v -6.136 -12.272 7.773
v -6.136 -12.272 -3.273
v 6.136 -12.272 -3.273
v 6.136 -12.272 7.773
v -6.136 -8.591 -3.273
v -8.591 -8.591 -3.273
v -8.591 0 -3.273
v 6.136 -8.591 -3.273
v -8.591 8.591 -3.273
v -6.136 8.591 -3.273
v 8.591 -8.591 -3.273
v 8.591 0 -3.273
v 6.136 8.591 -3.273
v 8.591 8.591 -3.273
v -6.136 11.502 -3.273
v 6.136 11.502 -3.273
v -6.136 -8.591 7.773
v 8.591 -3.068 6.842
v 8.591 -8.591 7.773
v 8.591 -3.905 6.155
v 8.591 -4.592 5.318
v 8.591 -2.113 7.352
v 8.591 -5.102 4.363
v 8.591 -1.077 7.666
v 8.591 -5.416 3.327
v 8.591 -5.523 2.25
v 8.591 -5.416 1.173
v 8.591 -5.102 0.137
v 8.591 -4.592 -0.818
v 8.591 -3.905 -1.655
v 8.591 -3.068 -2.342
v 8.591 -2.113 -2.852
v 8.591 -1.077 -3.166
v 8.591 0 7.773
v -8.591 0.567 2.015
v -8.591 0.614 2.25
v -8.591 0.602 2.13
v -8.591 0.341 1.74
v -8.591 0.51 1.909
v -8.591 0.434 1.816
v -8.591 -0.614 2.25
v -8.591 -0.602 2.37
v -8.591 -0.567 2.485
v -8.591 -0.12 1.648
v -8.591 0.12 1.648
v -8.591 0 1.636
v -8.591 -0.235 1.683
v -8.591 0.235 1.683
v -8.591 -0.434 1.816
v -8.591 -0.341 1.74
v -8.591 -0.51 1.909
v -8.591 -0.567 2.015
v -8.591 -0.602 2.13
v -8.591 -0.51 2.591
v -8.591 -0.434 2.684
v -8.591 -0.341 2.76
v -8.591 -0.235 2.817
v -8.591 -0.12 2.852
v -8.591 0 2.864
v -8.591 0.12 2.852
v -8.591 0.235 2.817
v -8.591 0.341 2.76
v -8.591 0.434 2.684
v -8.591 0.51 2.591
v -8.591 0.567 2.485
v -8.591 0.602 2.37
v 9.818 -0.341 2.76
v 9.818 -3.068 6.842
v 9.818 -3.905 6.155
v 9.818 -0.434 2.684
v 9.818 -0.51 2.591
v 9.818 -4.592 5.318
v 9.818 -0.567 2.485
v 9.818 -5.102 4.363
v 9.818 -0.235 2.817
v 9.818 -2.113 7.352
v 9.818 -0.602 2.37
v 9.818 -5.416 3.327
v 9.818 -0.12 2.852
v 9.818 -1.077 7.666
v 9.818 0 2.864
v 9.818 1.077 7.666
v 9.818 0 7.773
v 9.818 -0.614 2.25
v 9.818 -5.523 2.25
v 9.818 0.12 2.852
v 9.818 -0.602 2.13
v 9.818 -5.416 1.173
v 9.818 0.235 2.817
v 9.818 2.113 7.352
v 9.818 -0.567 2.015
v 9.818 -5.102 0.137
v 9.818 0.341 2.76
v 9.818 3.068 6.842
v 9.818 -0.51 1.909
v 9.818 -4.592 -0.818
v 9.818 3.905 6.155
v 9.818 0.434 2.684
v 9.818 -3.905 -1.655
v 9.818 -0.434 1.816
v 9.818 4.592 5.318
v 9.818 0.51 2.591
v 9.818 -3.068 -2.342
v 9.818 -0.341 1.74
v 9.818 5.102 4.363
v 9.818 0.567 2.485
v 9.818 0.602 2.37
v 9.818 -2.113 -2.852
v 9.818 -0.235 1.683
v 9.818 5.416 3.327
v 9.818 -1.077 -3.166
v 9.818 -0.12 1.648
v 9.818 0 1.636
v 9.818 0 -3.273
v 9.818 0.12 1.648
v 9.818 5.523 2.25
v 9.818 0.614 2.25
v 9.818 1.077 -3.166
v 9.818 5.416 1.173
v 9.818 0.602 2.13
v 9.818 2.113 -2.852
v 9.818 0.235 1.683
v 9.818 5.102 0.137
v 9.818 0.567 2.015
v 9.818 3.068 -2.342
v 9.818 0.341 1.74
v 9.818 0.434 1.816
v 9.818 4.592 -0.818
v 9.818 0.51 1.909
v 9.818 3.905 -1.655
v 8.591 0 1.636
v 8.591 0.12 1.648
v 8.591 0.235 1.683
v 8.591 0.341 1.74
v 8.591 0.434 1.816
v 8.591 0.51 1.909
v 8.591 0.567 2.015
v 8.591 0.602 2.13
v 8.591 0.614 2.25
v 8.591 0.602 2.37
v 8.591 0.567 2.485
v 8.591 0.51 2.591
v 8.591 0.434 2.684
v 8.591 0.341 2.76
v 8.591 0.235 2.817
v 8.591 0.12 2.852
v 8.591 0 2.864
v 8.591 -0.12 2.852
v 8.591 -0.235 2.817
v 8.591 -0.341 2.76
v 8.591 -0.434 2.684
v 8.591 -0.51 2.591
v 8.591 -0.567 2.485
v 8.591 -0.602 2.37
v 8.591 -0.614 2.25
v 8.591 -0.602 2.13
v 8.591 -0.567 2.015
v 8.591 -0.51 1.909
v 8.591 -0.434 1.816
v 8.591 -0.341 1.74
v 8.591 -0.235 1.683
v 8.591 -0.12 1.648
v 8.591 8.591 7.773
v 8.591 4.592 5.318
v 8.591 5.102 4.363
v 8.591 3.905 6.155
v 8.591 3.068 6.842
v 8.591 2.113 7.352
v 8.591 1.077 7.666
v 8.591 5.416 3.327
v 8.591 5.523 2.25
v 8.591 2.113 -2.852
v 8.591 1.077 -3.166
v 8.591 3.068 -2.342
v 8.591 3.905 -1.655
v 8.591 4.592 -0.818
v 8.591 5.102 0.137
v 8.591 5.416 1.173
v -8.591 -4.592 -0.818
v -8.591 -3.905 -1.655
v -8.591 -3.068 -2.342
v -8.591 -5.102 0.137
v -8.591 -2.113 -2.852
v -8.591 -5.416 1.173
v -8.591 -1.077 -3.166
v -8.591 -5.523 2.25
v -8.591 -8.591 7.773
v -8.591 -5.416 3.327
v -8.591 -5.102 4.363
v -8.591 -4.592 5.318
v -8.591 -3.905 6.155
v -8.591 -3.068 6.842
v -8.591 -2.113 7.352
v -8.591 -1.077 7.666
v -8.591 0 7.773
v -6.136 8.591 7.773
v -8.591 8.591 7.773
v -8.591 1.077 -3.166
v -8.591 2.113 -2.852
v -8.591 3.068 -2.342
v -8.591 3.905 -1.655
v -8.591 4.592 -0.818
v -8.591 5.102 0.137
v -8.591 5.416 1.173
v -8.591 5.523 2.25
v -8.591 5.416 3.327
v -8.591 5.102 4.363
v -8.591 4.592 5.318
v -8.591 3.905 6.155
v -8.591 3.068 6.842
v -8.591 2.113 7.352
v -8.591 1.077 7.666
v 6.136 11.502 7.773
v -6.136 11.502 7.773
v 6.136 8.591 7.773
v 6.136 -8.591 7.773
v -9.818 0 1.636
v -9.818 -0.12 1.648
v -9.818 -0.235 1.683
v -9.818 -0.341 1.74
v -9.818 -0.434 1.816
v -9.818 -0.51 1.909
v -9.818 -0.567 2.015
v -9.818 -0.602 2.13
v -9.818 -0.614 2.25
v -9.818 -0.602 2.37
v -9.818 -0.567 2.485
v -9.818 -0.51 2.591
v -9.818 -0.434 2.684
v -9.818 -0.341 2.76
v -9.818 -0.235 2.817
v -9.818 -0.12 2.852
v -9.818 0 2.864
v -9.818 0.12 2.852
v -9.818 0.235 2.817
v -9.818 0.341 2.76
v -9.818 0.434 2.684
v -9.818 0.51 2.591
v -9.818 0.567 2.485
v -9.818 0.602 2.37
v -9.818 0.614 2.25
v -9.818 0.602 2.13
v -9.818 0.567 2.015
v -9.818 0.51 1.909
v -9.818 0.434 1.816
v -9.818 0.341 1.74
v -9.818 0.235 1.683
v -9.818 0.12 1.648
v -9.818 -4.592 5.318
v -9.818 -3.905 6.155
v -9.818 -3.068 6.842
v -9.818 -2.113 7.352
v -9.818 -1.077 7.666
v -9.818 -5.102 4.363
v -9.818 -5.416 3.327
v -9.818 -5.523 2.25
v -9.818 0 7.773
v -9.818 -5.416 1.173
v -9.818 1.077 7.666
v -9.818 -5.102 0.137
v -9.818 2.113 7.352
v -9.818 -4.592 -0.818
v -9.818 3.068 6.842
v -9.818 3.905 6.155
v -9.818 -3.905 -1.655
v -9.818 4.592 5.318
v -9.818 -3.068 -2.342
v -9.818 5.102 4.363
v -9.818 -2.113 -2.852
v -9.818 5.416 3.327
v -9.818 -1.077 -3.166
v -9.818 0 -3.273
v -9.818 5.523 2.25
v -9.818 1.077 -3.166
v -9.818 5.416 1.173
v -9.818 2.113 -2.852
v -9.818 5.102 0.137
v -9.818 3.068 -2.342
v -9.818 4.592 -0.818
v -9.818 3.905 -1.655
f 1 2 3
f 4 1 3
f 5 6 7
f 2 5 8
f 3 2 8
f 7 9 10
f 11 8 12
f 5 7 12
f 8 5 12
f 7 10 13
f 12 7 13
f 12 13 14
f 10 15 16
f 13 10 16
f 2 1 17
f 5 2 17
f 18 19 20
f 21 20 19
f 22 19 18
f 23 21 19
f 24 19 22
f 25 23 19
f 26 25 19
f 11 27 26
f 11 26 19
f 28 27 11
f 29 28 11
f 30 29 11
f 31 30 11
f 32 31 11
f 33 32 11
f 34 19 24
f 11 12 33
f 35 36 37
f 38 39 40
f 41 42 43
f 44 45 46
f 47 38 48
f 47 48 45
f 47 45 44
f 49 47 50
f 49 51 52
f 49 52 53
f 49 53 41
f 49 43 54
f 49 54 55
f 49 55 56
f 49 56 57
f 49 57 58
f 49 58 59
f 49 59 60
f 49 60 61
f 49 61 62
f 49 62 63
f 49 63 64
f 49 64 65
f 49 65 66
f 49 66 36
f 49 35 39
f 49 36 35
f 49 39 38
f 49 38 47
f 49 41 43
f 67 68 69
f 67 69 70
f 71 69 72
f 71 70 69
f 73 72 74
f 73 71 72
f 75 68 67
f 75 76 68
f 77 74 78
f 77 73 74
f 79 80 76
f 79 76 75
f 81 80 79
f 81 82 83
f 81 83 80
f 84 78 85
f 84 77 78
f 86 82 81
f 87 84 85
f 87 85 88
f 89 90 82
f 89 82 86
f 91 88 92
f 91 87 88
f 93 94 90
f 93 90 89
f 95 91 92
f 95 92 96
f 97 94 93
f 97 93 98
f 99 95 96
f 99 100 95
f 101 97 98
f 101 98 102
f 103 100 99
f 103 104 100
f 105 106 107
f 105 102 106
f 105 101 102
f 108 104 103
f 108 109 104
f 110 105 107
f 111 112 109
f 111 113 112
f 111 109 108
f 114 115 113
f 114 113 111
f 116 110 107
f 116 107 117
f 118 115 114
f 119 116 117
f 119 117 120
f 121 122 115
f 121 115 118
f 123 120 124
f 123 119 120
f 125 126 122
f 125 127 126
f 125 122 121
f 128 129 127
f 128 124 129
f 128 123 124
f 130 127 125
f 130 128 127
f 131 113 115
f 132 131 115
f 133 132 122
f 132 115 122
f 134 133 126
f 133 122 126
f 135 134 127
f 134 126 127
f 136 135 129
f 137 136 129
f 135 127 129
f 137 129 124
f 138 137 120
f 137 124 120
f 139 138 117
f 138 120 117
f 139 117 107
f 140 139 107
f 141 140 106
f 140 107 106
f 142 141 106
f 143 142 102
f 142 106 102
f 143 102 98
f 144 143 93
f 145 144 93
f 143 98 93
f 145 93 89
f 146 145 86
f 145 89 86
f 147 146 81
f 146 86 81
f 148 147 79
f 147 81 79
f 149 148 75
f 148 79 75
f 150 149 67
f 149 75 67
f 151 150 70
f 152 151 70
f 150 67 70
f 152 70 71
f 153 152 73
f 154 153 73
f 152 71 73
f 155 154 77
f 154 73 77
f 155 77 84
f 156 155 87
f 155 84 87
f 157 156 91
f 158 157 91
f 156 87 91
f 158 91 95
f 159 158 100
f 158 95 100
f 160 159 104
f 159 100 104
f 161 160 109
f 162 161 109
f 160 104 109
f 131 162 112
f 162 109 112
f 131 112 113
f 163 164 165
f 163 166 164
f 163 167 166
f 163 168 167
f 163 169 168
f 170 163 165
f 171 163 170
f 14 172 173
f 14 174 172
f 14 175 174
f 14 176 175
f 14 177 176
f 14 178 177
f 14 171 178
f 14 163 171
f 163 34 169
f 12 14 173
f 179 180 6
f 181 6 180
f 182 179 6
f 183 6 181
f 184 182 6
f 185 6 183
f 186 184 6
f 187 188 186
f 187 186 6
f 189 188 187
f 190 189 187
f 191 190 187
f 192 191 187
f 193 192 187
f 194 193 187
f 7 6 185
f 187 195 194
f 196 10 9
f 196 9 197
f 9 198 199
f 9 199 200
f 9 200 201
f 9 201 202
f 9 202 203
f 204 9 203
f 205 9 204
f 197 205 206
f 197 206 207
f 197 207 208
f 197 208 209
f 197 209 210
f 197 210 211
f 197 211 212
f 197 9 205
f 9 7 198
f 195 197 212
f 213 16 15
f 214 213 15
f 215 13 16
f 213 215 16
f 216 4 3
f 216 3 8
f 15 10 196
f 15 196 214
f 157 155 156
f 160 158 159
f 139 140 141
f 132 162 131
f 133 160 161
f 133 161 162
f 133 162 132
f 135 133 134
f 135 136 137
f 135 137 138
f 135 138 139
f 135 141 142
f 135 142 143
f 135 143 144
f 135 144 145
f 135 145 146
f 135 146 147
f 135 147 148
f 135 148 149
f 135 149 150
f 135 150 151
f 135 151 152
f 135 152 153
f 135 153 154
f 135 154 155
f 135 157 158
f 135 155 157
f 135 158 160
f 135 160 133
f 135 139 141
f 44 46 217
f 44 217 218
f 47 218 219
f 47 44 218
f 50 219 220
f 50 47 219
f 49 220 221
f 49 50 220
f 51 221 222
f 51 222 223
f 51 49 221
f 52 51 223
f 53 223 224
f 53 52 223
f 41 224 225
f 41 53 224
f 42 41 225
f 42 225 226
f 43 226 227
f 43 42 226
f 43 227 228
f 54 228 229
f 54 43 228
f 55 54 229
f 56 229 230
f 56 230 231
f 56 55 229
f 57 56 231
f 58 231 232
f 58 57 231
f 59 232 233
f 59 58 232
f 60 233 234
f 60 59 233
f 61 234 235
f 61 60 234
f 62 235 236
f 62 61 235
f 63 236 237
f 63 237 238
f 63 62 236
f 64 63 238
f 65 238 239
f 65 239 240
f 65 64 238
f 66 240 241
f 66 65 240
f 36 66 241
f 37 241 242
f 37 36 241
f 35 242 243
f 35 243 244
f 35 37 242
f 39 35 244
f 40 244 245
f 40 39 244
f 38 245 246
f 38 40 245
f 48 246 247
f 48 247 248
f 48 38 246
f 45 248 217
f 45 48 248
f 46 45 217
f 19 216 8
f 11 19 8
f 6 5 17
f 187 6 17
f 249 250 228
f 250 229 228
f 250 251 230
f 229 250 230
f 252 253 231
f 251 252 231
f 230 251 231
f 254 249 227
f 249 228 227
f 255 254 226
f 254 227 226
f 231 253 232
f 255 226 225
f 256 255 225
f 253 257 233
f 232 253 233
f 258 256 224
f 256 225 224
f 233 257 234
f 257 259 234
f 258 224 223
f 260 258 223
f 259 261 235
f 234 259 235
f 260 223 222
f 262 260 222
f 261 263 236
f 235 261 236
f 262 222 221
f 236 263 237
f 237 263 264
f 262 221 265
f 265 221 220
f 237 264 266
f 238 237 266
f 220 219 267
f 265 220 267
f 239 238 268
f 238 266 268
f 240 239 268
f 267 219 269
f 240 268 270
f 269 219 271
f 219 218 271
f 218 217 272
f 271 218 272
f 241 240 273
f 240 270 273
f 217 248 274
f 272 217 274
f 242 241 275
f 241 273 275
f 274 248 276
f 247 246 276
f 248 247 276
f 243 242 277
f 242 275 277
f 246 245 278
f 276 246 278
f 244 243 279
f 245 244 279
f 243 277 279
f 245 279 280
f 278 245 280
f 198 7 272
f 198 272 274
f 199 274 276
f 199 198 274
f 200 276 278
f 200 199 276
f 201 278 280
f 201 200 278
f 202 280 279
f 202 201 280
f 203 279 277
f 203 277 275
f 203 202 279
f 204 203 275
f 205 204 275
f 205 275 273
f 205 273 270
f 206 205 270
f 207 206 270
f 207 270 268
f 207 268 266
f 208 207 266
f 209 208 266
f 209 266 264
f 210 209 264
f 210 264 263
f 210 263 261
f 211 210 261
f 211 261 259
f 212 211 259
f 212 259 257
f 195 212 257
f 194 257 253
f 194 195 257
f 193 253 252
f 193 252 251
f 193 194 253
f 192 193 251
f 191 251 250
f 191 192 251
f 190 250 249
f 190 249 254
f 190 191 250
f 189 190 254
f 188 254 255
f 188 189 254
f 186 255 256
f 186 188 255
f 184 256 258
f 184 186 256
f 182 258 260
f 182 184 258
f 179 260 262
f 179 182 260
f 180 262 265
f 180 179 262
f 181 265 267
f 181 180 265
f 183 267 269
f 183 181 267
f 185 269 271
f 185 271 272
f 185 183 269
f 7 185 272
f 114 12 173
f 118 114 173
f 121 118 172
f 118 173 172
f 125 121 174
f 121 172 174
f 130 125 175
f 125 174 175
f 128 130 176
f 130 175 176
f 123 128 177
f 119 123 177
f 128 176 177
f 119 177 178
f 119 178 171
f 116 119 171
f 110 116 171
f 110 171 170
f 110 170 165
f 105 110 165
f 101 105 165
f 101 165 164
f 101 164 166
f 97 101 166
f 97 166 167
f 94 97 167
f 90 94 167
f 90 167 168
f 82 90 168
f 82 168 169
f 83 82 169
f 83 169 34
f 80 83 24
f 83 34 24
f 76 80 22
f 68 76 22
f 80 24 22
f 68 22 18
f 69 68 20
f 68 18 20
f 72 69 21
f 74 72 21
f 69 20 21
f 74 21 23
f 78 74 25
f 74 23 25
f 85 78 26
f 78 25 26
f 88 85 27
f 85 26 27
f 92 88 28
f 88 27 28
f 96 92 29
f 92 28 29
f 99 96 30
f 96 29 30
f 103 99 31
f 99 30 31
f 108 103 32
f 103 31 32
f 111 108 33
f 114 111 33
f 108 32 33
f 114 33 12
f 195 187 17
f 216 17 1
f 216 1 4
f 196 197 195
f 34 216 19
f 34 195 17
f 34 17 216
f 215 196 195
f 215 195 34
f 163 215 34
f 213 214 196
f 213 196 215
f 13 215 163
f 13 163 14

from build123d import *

# Parameters (mm, degrees)
SKETCH_4_W          = 5
SKETCH_4_H          = 10
EXTRUDE_2_DEPTH     = 4.5
SKETCH_5_W          = 4.5
SKETCH_5_H          = 7
EXTRUDE_3_DEPTH     = 1
SKETCH_6_W          = 4.5
SKETCH_6_H          = 7
EXTRUDE_4_DEPTH     = 1
SKETCH_7_R          = 2.25
EXTRUDE_5_DEPTH     = 0.5
SKETCH_8_R          = 0.25
CUT_EXTRUDE_1_DEPTH = 0.5
CUT_EXTRUDE_START   = -0.5
SKETCH_9_R          = 0.25
CUT_EXTRUDE_2_DEPTH = 0.5
SCALE_1_SCALE       = 3.181818182
SCALE_2_SCALE       = 2.454545455
SCALE_3_SCALE       = 0.771428571
SCALE_4_SCALE       = 0.407393437
SKETCH_10_W         = 14.212580929
SKETCH_10_H         = 3.204768758
CUT_EXTRUDE_3_DEPTH = 20.209197968


with BuildPart() as part:
    # 草图4 → 凸台-拉伸2 (new body)
    with BuildSketch(Plane.XY):
        Rectangle(SKETCH_4_W, SKETCH_4_H)
    extrude(amount=EXTRUDE_2_DEPTH)

    # 草图5 → 凸台-拉伸3 (add)
    with BuildSketch(Plane(origin=(2.5, 0, 0), x_dir=(0, 0, -1), z_dir=(1, 0, 0))):
        with Locations((-2.25, 0)):
            Rectangle(SKETCH_5_W, SKETCH_5_H)
    extrude(amount=EXTRUDE_3_DEPTH)

    # 草图6 → 凸台-拉伸4 (add)
    with BuildSketch(Plane.ZY.offset(2.5)):
        with Locations((2.25, 0)):
            Rectangle(SKETCH_6_W, SKETCH_6_H)
    extrude(amount=EXTRUDE_4_DEPTH)

    # 草图7 → 凸台-拉伸5 (add)
    with BuildSketch(Plane(origin=(3.5, 0, 0), x_dir=(0, 0, -1), z_dir=(1, 0, 0))):
        with Locations((-2.25, 0)):
            Circle(SKETCH_7_R)
    extrude_5 = extrude(amount=EXTRUDE_5_DEPTH)

    # 镜向1: 凸台-拉伸5 across plane
    add(extrude_5.mirror(Plane(origin=(0, 0, 0), x_dir=(0, 0, 1), z_dir=(1, 0, 0))))

    # 草图8 → 切除-拉伸1 (cut)
    with BuildSketch(Plane(origin=(4, 0, 0), x_dir=(0, 0, -1), z_dir=(1, 0, 0))):
        with Locations((-2.25, 0)):
            Circle(SKETCH_8_R)
    extrude(amount=-CUT_EXTRUDE_1_DEPTH, mode=Mode.SUBTRACT)

    # 草图9 → 切除-拉伸2 (cut)
    with BuildSketch(Plane.ZY.offset(4).offset(CUT_EXTRUDE_START)):
        with Locations(Location((2.25, 0, 0), (0, 0, 180))):
            Circle(SKETCH_9_R)
    extrude(amount=CUT_EXTRUDE_2_DEPTH, mode=Mode.SUBTRACT)


with BuildPart() as part_1:
    # 缩放比例1: scaled about (0, 0, 2.25)
    add(part.part.scale(SCALE_1_SCALE).moved(Location((0, 0, -4.909090909))))


with BuildPart() as part_2:
    # 缩放比例2: scaled about (0, 0, 2.25)
    add(part_1.part.scale(SCALE_2_SCALE).moved(Location((0, 0, -3.272727273))))


with BuildPart() as part_3:
    # 缩放比例3: scaled about (0, 0, 2.25)
    add(part_2.part.scale(SCALE_3_SCALE).moved(Location((0, 0, 0.514285714))))


with BuildPart() as part_4:
    # 缩放比例4: scaled about (0, 0, 2.25)
    add(part_3.part.scale(SCALE_4_SCALE).moved(Location((0, 0, 1.333364768))))

    # 草图10 → 切除-拉伸3 (cut, through all)
    with BuildSketch(Plane(origin=(0, 0, -3.272537886), x_dir=(-1, 0, 0), z_dir=(0, 0, -1))):
        with Locations((0.970137257, 13.104690793)):
            Rectangle(SKETCH_10_W, SKETCH_10_H)
    extrude(amount=-CUT_EXTRUDE_3_DEPTH, mode=Mode.SUBTRACT)


solid = part_4.part
